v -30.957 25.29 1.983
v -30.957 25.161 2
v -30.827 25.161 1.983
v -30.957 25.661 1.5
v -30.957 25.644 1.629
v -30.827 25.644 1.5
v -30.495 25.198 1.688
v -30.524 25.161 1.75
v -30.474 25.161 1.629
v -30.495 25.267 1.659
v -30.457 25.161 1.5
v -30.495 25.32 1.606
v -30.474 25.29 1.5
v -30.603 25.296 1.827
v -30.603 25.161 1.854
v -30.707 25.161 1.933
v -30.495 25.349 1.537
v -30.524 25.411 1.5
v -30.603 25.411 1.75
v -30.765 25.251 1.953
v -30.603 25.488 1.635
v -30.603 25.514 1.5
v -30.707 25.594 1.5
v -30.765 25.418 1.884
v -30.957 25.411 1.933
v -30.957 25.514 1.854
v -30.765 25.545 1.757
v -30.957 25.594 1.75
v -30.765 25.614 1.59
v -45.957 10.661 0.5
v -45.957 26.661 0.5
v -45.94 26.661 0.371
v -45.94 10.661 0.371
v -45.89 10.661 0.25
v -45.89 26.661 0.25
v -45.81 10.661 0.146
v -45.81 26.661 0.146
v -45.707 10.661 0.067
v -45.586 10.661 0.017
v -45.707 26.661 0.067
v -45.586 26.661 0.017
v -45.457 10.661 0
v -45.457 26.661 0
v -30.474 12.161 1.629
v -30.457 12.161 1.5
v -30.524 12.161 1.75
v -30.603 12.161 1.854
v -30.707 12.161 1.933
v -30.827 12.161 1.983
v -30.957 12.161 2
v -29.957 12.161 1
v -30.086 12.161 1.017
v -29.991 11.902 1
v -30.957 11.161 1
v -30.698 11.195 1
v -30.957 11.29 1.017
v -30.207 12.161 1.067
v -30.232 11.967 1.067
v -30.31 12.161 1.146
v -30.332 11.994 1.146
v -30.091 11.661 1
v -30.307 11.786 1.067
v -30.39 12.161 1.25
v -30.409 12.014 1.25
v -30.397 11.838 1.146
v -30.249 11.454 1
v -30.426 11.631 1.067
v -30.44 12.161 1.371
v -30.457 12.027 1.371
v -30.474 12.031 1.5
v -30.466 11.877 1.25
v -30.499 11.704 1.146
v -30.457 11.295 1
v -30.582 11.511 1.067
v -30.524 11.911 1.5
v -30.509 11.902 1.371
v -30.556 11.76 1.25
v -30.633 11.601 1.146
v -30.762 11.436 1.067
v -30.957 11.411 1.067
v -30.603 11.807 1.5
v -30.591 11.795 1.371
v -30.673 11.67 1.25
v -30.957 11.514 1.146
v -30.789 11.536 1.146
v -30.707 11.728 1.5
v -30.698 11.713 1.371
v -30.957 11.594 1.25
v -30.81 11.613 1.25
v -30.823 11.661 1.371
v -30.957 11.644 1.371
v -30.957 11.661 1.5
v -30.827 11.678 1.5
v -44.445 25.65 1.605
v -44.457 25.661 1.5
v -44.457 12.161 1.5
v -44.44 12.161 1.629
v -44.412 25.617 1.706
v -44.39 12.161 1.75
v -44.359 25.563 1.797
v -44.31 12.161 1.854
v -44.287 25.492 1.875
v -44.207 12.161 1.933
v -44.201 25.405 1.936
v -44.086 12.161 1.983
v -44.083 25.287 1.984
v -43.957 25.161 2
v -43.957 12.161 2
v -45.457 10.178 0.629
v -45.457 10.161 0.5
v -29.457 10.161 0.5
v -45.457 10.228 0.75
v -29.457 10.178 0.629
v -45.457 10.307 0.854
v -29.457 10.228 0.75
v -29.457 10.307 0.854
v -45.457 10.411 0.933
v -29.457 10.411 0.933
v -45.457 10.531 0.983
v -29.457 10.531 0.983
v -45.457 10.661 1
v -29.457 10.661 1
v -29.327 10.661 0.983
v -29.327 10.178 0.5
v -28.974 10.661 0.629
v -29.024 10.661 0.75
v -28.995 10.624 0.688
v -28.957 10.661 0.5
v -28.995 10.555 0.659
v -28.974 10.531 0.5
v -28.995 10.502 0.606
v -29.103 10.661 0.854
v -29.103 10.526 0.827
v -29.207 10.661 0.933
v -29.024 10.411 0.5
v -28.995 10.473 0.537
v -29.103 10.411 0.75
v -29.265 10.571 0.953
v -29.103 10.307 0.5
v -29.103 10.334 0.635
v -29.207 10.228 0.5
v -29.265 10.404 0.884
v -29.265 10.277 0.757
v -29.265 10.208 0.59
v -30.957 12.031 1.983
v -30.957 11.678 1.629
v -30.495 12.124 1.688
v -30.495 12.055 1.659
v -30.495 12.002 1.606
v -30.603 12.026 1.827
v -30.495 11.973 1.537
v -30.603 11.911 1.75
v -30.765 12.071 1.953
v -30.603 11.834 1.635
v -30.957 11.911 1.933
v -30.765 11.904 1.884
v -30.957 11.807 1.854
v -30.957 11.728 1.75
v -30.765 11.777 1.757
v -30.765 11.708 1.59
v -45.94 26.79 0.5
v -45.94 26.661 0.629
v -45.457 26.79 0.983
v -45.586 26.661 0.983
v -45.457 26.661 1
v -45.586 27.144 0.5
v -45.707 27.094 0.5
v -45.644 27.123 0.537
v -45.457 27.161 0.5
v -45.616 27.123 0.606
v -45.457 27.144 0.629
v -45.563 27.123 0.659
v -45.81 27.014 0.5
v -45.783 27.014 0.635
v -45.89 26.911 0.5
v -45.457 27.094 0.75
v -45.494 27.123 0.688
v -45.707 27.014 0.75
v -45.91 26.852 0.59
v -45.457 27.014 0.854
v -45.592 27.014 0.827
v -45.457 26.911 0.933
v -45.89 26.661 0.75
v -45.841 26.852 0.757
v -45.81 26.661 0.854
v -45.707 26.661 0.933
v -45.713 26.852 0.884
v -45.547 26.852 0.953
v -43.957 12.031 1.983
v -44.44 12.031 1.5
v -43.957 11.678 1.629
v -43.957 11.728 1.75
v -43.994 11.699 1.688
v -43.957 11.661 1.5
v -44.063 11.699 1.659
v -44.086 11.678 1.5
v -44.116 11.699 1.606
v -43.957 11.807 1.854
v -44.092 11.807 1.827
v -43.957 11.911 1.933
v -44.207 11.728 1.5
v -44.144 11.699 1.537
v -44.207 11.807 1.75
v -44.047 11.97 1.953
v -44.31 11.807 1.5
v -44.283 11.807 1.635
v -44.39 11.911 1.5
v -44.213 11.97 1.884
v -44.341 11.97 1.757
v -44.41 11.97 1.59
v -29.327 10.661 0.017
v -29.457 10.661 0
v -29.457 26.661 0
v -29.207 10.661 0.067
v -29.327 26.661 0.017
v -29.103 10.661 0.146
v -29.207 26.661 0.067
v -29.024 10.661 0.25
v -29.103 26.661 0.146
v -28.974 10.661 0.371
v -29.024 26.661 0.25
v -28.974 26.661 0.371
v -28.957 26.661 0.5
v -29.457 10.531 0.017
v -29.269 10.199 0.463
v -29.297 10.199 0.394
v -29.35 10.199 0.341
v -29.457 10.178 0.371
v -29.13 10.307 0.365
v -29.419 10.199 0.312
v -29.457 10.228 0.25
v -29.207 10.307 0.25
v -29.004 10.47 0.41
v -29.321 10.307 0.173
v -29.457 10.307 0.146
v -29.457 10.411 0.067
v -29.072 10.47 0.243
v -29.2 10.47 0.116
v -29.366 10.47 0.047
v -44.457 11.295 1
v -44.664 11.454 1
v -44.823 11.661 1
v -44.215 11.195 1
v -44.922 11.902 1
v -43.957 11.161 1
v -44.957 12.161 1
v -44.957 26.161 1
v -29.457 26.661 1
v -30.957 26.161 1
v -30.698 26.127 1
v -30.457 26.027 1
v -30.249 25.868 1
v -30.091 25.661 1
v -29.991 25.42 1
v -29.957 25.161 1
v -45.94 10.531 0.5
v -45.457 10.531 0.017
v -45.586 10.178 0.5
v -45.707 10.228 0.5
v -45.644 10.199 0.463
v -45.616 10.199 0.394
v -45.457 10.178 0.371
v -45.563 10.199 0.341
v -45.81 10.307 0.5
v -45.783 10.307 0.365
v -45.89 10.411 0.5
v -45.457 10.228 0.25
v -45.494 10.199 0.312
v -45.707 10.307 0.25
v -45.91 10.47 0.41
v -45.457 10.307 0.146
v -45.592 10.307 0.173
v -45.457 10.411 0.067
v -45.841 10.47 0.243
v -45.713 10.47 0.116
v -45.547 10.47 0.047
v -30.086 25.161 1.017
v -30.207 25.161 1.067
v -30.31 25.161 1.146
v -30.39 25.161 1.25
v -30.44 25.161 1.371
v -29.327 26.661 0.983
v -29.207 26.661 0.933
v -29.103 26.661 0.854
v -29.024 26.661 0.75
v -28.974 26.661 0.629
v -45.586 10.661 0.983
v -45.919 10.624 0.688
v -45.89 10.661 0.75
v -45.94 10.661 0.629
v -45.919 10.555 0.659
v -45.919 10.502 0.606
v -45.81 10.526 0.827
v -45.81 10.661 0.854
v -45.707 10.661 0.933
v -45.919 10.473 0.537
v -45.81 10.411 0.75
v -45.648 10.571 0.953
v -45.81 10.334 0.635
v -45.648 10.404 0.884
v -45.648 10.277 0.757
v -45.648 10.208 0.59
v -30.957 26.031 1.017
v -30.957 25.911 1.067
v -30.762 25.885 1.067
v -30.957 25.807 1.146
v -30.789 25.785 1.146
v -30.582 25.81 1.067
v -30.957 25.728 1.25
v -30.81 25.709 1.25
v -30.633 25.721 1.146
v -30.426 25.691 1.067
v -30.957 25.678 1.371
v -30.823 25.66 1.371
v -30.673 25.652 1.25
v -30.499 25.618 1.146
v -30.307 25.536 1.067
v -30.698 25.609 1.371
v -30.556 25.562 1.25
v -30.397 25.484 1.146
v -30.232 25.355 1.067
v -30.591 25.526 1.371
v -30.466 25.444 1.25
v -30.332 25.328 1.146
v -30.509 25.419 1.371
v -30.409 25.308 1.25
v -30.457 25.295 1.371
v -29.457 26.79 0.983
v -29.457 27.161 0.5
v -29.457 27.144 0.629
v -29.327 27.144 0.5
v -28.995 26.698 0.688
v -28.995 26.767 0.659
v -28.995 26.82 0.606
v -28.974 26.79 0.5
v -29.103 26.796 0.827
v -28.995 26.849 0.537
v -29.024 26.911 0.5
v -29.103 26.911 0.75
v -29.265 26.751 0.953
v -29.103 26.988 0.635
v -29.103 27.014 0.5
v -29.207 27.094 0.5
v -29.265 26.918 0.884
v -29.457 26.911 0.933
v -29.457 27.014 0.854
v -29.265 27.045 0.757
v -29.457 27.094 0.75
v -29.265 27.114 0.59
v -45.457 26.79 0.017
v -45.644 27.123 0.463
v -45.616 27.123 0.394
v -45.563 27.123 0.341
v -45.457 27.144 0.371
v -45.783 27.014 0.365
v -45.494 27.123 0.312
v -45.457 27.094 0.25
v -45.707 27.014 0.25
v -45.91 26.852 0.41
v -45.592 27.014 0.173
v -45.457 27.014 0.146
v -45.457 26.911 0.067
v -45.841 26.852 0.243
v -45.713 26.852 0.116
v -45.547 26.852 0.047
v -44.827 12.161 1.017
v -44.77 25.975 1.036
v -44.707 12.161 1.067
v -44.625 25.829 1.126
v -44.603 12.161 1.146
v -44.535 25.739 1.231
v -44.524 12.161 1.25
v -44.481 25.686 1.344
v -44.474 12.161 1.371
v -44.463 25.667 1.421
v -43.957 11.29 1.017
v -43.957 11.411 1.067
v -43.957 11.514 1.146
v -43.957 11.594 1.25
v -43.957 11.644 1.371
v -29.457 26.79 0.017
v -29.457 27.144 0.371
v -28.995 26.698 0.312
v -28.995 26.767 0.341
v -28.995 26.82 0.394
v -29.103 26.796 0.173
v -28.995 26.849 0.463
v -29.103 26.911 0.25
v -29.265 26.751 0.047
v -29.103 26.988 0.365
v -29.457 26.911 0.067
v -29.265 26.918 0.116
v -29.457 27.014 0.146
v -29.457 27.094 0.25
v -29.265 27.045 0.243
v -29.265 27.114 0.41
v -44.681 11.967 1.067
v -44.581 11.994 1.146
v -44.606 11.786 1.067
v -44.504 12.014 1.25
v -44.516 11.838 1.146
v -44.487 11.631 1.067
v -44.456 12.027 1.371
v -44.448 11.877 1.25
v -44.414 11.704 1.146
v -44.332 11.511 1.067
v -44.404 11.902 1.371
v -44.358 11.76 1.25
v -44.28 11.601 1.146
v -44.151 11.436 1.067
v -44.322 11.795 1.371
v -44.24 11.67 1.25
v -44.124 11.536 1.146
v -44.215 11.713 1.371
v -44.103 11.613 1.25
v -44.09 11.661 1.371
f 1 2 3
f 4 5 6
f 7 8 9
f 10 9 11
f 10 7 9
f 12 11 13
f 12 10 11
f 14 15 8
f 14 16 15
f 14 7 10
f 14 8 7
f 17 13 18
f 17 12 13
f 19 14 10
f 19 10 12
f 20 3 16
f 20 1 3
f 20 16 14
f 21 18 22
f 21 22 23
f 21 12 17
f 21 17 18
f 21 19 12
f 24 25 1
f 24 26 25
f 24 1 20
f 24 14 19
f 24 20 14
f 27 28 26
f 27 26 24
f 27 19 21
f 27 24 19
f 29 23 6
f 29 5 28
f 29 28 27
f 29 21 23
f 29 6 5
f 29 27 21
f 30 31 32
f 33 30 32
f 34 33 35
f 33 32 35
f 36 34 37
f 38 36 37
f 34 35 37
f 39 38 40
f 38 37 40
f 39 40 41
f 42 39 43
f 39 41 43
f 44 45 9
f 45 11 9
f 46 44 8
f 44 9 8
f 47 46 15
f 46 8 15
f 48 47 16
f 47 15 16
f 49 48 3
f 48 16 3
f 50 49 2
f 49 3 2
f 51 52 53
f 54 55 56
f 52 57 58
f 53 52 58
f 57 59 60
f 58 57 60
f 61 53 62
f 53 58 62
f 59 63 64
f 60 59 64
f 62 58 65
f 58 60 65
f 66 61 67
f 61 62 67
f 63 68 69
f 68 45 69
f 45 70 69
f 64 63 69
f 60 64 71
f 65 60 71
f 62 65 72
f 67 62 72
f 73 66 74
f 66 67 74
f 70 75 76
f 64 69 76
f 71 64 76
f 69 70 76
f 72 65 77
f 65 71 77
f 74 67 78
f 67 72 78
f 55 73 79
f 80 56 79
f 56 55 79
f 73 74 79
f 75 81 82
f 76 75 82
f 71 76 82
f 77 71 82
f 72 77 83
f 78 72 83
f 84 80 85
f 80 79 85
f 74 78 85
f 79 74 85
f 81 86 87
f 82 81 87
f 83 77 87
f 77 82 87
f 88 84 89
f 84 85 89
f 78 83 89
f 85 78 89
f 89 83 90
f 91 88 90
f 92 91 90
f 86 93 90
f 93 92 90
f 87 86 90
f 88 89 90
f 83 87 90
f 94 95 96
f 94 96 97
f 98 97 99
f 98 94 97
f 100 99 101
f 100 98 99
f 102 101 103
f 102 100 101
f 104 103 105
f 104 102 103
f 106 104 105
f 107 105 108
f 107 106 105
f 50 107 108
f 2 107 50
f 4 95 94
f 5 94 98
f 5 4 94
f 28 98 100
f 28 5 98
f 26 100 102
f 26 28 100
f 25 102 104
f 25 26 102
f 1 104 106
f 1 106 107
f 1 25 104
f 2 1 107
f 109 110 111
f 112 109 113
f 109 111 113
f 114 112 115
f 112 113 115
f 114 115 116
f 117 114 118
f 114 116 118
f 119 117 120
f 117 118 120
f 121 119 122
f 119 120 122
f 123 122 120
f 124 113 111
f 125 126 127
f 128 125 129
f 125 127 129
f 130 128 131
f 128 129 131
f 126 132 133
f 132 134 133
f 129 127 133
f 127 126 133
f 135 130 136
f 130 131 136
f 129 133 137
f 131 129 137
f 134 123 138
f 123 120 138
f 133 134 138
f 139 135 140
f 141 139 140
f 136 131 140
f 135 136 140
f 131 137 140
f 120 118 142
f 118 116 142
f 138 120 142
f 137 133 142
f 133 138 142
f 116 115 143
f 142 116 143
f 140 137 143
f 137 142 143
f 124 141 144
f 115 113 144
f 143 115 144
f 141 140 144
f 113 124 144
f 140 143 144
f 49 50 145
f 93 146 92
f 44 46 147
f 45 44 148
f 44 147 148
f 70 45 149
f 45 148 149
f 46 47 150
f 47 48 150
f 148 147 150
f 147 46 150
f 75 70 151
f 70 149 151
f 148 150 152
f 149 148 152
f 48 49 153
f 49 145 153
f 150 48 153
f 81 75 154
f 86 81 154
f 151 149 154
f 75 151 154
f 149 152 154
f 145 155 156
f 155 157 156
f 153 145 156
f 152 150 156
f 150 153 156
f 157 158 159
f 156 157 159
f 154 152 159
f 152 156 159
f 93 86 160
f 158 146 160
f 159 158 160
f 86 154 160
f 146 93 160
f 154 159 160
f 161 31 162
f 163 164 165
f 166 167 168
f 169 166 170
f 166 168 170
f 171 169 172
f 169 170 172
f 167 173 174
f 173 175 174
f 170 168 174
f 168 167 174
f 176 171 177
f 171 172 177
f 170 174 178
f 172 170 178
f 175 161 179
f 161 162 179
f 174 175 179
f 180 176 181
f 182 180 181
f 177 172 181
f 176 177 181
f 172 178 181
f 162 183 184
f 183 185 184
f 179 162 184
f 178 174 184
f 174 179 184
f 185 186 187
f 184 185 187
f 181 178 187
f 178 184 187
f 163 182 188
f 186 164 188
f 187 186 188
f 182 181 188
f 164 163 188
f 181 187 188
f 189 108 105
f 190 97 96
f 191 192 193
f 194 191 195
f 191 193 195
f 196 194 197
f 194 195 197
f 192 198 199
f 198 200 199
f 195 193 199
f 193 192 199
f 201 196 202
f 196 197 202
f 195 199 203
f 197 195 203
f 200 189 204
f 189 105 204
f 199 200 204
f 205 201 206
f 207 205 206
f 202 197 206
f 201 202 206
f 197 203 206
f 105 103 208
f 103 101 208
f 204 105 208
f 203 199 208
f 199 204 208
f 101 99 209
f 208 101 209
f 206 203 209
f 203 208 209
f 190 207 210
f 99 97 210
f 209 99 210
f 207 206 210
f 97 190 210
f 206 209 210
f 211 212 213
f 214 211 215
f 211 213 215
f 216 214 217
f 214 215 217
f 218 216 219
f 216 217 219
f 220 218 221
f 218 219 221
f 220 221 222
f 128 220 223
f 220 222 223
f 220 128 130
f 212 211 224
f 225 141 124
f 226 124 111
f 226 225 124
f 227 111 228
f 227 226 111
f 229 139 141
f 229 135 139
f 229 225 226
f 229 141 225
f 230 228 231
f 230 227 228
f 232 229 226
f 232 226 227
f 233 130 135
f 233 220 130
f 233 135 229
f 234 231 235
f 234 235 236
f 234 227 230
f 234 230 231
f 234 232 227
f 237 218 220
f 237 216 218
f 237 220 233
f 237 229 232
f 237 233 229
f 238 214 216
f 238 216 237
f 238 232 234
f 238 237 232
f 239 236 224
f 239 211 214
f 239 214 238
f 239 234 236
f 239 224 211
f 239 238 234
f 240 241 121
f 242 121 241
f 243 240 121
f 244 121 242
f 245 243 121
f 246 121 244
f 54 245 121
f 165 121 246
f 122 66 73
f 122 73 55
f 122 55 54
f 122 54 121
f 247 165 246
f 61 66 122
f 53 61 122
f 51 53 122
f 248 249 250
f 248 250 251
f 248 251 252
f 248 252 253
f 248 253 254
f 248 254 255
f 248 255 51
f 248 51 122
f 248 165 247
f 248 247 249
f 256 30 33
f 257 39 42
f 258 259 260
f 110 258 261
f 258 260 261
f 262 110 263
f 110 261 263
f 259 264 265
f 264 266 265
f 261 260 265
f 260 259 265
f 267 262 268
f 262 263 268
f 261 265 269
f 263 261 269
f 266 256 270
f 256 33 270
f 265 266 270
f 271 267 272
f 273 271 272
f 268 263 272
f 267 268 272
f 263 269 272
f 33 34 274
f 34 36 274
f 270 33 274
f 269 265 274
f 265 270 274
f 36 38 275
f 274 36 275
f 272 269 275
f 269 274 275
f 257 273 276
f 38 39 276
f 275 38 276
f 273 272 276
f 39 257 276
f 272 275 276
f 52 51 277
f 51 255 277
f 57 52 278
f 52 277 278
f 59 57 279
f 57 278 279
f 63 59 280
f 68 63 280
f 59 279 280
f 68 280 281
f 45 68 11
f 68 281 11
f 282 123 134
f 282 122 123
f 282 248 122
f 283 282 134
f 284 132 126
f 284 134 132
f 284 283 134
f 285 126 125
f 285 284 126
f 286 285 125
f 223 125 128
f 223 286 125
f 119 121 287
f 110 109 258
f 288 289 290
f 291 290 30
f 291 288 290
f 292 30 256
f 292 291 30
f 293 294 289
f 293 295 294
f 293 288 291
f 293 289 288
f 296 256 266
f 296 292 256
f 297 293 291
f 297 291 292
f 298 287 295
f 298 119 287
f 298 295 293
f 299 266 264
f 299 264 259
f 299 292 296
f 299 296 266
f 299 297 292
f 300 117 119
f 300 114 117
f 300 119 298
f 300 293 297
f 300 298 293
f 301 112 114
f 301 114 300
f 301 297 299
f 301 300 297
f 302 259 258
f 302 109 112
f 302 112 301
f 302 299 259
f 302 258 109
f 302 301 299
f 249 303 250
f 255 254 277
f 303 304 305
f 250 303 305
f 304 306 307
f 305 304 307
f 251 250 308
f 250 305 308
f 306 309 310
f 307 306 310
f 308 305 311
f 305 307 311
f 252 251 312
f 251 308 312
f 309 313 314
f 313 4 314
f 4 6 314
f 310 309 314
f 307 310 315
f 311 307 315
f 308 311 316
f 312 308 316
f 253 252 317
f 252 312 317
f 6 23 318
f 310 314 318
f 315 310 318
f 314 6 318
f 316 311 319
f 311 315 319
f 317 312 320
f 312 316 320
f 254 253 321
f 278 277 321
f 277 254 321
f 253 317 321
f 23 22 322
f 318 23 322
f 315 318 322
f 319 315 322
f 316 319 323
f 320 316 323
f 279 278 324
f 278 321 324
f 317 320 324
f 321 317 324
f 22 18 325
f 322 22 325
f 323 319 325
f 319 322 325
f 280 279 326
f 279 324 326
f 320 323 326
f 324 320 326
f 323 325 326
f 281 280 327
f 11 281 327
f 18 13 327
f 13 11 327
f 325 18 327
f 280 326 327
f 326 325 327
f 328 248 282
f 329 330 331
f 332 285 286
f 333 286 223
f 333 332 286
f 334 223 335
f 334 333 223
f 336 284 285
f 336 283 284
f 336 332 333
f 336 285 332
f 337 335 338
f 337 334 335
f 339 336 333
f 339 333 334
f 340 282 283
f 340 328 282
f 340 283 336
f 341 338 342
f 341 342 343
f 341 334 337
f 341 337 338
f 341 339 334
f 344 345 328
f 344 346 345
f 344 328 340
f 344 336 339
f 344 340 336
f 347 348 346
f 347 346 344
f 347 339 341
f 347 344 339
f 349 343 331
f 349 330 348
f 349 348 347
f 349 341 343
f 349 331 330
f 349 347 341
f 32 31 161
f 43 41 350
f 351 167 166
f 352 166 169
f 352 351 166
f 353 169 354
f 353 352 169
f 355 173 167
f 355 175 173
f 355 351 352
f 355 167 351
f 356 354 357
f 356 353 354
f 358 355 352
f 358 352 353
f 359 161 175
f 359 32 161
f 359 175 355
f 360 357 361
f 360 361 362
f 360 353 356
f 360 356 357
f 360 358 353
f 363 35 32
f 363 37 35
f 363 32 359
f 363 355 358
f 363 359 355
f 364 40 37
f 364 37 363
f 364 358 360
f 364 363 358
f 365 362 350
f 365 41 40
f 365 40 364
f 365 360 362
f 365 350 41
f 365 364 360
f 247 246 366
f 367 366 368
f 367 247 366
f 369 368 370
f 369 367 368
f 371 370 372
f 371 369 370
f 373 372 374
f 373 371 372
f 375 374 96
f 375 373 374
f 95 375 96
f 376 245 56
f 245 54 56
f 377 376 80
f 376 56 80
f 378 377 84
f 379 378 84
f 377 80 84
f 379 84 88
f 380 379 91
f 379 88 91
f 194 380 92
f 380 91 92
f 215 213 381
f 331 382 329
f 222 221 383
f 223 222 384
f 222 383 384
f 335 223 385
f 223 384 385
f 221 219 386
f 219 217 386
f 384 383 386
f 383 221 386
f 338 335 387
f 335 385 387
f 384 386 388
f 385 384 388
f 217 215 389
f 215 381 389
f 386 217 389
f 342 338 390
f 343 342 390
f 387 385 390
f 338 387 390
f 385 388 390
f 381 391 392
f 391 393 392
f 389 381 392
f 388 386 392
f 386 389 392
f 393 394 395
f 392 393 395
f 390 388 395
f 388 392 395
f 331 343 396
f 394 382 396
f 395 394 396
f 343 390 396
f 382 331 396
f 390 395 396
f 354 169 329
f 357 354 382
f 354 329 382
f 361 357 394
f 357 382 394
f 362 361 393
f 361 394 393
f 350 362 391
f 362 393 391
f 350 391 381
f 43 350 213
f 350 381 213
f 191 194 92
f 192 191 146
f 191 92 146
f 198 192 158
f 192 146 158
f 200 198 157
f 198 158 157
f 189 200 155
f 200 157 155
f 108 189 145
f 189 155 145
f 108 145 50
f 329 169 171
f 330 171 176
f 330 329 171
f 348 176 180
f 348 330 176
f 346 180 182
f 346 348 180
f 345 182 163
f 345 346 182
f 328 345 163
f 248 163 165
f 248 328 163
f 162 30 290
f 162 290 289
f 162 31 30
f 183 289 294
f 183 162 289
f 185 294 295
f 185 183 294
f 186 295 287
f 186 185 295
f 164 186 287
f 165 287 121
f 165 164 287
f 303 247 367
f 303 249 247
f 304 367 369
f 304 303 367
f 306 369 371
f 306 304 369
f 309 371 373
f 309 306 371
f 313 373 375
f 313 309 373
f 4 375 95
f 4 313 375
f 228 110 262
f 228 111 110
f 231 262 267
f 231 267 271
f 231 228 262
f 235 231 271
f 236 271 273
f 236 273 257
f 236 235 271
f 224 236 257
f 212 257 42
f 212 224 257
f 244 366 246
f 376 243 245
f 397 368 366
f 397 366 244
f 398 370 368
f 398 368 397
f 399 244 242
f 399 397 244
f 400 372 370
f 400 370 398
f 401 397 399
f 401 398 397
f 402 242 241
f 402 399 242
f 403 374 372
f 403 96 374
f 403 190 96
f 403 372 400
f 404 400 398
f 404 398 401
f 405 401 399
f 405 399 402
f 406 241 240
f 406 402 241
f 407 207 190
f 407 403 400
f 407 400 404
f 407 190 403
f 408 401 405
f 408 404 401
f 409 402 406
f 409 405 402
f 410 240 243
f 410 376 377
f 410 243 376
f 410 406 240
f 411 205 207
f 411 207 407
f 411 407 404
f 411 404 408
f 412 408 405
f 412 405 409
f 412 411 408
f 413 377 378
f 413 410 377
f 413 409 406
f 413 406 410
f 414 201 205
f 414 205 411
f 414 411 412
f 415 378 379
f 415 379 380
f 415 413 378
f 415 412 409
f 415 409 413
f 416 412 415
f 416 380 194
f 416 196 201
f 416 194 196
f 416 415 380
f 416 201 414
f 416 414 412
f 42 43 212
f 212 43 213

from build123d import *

# Parameters (mm, degrees)
F0_W     = 17
F0_H     = 17
F1_DEPTH = 1
F2_W     = 14
F2_H     = 14
F3_DEPTH = 1
F4_R     = 0.49999


# Not quite as in the source:
# - a fillet or chamfer is up to 0.001 mm smaller than in the source, because OpenCascade refuses the exact size


with BuildPart() as f1:
    # F0 (on Top) → F1 (new body)
    with BuildSketch(Plane.XY):
        with Locations((-37.4565784931, 18.6608627687)):
            Rectangle(F0_W, F0_H)
    extrude(amount=F1_DEPTH)

    # F2 (on face) → F3 (join)
    with BuildSketch(Plane.XY.offset(1)):
        with Locations((-37.4565784931, 18.6608627687)):
            Rectangle(F2_W, F2_H)
    extrude(amount=F3_DEPTH)

    # F4 (radius 0.5 in the source; OpenCascade refuses exactly that, so slightly less here)
    f4_edges = [f1.edges().sort_by_distance(p)[0] for p in [
        (-37.456578, 25.660863, 2),
        (-44.456578, 18.660863, 2),
        (-44.456578, 18.660863, 1),
        (-37.456578, 25.660863, 1),
        (-37.456578, 11.660863, 2),
        (-37.456578, 10.160863, 1),
        (-45.956578, 18.660863, 1),
        (-45.956578, 18.660863, 0),
        (-45.956578, 27.160863, 0.5),
        (-37.456578, 27.160863, 1),
        (-37.456578, 27.160863, 0),
        (-30.456578, 18.660863, 1),
        (-30.456578, 18.660863, 2),
        (-30.456578, 25.660863, 1.5),
        (-28.956578, 18.660863, 1),
        (-28.956578, 18.660863, 0),
        (-28.956578, 27.160863, 0.5),
        (-28.956578, 10.160863, 0.5),
        (-45.956578, 10.160863, 0.5),
        (-37.456578, 10.160863, 0),
        (-37.456578, 11.660863, 1),
        (-44.456578, 11.660863, 1.5),
        (-30.456578, 11.660863, 1.5),
    ]]
    fillet(f4_edges, radius=F4_R)


solid = f1.part
